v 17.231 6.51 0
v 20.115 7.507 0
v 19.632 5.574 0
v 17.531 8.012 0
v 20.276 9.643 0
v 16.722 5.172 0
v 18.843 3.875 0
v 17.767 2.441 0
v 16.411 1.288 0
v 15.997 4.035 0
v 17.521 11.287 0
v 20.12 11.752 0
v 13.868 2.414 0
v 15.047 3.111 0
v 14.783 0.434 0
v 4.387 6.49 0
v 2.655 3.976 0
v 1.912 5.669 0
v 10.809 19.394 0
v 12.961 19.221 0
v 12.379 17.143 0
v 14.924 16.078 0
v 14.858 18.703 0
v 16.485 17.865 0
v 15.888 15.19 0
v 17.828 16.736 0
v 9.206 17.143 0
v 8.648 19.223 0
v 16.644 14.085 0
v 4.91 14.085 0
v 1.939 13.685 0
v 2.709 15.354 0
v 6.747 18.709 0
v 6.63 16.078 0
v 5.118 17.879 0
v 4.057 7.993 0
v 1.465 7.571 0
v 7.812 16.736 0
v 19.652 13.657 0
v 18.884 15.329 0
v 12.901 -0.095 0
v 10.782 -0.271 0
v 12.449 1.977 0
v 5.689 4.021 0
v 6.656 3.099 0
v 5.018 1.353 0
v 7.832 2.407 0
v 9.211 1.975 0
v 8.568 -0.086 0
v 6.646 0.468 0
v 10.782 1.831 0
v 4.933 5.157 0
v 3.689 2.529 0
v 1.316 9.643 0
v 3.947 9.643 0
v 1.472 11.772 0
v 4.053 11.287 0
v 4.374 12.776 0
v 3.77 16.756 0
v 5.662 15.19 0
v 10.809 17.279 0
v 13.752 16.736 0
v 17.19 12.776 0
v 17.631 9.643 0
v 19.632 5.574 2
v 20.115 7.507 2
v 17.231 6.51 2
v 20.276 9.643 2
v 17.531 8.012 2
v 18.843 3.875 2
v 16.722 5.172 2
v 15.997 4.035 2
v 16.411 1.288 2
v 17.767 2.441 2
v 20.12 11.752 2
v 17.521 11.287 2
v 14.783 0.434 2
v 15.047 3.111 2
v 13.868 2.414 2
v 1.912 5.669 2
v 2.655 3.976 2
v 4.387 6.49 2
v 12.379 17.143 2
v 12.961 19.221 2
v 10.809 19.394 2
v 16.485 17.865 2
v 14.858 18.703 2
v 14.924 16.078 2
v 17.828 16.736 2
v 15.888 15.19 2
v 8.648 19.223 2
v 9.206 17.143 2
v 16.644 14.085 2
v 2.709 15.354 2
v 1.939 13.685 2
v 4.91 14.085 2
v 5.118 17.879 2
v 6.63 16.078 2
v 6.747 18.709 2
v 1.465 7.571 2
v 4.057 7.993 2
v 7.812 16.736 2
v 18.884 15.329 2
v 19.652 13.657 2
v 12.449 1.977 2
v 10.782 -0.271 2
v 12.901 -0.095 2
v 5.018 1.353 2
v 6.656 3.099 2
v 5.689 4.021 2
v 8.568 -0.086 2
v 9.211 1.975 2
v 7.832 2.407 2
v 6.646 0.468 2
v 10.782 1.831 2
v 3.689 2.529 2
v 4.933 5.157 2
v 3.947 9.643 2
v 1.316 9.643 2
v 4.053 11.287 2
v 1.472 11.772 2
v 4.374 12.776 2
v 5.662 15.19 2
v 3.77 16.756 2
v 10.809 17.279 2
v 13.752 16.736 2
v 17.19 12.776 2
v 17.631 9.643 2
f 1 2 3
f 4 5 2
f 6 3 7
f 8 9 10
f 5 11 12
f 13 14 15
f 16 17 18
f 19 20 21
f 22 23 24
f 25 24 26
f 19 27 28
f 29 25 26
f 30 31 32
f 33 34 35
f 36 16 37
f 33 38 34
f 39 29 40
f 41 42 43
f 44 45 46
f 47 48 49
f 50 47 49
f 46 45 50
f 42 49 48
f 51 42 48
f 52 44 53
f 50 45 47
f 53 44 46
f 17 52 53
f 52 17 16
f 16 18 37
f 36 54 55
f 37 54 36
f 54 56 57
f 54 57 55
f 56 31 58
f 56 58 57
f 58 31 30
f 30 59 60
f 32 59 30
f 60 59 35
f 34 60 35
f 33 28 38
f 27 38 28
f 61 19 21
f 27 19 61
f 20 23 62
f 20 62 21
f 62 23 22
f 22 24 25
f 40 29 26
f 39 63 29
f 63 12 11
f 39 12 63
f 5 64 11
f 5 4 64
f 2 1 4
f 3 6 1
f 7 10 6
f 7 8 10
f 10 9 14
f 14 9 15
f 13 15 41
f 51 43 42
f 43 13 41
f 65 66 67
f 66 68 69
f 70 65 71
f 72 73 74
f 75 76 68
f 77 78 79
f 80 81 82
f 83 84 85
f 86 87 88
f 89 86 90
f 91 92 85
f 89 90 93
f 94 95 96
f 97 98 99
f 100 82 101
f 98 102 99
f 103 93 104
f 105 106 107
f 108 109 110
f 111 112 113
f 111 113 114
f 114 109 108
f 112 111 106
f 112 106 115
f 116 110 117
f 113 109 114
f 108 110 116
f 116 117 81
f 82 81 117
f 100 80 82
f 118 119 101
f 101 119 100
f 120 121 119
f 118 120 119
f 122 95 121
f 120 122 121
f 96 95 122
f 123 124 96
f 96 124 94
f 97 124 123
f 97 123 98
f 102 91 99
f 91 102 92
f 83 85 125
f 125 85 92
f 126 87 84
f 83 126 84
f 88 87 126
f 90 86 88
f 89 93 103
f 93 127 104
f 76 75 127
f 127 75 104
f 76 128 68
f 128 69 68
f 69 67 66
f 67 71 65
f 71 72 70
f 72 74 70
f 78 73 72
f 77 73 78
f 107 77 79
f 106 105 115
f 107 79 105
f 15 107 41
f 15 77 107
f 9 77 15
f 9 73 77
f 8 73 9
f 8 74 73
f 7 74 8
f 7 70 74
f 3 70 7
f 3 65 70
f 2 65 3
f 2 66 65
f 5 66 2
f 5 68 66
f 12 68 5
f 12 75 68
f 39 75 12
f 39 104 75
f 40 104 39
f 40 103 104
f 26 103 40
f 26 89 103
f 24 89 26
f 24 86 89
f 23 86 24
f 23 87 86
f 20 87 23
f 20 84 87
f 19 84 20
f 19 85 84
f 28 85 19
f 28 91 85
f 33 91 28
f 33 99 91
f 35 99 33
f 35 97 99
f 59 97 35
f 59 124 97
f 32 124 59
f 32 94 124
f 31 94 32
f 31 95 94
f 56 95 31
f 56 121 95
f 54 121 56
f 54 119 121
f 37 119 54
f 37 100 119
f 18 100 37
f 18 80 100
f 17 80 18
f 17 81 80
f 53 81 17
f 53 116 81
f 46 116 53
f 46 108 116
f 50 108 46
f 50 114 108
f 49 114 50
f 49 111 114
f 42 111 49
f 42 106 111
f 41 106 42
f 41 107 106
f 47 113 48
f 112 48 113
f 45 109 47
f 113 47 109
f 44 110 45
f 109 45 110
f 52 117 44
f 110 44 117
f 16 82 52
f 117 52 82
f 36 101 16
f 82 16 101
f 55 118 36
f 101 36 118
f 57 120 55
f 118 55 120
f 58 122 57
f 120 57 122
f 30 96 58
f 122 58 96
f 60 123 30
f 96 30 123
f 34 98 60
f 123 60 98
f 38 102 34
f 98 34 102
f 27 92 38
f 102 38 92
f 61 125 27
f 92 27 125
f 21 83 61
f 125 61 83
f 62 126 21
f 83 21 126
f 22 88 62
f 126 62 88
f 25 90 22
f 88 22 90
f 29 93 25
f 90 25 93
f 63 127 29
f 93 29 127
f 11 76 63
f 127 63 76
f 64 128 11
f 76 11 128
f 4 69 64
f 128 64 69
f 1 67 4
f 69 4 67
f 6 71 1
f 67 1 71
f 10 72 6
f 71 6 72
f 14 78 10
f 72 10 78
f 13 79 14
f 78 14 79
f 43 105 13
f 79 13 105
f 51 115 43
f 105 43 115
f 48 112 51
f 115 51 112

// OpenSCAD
// A glyph with a counter, which is a hole in the letter's cap face.
//
// The patch recogniser skipped hole loops when working out what each patch
// boundary borders, so a run along the inside of an O found one user instead of
// two and stayed UNRESOLVED - and a patch with an unresolved boundary is
// dropped. This letter kept eight of its nineteen patches and wrote eleven
// B-splines, which is most of the alphabet quietly half-collapsing: O, A, B, D,
// P, R, e, o and the rest all have one.
//
// A patch's *facets* are always outer bounds - a hole is not a sheet of anything
// - but what a patch borders may perfectly well be one. The band path had always
// used every valid loop for that lookup and the emitter already substitutes into
// a hole loop, so the patch path was simply inconsistent with both.
//
// EXPECT: 19 analytic surfaces available (0 cylindrical, 0 spherical, 0 toroidal, 19 Bezier)
// EXPECT: 19 Bezier patches cover 38 facets
// EXPECT: 0 unresolved
// EXPECT: written as 23 faces instead of 42
// CANONICAL: spline=19
$fn = 8;
linear_extrude(height = 2) text("O", size = 20, font = "Liberation Sans");
